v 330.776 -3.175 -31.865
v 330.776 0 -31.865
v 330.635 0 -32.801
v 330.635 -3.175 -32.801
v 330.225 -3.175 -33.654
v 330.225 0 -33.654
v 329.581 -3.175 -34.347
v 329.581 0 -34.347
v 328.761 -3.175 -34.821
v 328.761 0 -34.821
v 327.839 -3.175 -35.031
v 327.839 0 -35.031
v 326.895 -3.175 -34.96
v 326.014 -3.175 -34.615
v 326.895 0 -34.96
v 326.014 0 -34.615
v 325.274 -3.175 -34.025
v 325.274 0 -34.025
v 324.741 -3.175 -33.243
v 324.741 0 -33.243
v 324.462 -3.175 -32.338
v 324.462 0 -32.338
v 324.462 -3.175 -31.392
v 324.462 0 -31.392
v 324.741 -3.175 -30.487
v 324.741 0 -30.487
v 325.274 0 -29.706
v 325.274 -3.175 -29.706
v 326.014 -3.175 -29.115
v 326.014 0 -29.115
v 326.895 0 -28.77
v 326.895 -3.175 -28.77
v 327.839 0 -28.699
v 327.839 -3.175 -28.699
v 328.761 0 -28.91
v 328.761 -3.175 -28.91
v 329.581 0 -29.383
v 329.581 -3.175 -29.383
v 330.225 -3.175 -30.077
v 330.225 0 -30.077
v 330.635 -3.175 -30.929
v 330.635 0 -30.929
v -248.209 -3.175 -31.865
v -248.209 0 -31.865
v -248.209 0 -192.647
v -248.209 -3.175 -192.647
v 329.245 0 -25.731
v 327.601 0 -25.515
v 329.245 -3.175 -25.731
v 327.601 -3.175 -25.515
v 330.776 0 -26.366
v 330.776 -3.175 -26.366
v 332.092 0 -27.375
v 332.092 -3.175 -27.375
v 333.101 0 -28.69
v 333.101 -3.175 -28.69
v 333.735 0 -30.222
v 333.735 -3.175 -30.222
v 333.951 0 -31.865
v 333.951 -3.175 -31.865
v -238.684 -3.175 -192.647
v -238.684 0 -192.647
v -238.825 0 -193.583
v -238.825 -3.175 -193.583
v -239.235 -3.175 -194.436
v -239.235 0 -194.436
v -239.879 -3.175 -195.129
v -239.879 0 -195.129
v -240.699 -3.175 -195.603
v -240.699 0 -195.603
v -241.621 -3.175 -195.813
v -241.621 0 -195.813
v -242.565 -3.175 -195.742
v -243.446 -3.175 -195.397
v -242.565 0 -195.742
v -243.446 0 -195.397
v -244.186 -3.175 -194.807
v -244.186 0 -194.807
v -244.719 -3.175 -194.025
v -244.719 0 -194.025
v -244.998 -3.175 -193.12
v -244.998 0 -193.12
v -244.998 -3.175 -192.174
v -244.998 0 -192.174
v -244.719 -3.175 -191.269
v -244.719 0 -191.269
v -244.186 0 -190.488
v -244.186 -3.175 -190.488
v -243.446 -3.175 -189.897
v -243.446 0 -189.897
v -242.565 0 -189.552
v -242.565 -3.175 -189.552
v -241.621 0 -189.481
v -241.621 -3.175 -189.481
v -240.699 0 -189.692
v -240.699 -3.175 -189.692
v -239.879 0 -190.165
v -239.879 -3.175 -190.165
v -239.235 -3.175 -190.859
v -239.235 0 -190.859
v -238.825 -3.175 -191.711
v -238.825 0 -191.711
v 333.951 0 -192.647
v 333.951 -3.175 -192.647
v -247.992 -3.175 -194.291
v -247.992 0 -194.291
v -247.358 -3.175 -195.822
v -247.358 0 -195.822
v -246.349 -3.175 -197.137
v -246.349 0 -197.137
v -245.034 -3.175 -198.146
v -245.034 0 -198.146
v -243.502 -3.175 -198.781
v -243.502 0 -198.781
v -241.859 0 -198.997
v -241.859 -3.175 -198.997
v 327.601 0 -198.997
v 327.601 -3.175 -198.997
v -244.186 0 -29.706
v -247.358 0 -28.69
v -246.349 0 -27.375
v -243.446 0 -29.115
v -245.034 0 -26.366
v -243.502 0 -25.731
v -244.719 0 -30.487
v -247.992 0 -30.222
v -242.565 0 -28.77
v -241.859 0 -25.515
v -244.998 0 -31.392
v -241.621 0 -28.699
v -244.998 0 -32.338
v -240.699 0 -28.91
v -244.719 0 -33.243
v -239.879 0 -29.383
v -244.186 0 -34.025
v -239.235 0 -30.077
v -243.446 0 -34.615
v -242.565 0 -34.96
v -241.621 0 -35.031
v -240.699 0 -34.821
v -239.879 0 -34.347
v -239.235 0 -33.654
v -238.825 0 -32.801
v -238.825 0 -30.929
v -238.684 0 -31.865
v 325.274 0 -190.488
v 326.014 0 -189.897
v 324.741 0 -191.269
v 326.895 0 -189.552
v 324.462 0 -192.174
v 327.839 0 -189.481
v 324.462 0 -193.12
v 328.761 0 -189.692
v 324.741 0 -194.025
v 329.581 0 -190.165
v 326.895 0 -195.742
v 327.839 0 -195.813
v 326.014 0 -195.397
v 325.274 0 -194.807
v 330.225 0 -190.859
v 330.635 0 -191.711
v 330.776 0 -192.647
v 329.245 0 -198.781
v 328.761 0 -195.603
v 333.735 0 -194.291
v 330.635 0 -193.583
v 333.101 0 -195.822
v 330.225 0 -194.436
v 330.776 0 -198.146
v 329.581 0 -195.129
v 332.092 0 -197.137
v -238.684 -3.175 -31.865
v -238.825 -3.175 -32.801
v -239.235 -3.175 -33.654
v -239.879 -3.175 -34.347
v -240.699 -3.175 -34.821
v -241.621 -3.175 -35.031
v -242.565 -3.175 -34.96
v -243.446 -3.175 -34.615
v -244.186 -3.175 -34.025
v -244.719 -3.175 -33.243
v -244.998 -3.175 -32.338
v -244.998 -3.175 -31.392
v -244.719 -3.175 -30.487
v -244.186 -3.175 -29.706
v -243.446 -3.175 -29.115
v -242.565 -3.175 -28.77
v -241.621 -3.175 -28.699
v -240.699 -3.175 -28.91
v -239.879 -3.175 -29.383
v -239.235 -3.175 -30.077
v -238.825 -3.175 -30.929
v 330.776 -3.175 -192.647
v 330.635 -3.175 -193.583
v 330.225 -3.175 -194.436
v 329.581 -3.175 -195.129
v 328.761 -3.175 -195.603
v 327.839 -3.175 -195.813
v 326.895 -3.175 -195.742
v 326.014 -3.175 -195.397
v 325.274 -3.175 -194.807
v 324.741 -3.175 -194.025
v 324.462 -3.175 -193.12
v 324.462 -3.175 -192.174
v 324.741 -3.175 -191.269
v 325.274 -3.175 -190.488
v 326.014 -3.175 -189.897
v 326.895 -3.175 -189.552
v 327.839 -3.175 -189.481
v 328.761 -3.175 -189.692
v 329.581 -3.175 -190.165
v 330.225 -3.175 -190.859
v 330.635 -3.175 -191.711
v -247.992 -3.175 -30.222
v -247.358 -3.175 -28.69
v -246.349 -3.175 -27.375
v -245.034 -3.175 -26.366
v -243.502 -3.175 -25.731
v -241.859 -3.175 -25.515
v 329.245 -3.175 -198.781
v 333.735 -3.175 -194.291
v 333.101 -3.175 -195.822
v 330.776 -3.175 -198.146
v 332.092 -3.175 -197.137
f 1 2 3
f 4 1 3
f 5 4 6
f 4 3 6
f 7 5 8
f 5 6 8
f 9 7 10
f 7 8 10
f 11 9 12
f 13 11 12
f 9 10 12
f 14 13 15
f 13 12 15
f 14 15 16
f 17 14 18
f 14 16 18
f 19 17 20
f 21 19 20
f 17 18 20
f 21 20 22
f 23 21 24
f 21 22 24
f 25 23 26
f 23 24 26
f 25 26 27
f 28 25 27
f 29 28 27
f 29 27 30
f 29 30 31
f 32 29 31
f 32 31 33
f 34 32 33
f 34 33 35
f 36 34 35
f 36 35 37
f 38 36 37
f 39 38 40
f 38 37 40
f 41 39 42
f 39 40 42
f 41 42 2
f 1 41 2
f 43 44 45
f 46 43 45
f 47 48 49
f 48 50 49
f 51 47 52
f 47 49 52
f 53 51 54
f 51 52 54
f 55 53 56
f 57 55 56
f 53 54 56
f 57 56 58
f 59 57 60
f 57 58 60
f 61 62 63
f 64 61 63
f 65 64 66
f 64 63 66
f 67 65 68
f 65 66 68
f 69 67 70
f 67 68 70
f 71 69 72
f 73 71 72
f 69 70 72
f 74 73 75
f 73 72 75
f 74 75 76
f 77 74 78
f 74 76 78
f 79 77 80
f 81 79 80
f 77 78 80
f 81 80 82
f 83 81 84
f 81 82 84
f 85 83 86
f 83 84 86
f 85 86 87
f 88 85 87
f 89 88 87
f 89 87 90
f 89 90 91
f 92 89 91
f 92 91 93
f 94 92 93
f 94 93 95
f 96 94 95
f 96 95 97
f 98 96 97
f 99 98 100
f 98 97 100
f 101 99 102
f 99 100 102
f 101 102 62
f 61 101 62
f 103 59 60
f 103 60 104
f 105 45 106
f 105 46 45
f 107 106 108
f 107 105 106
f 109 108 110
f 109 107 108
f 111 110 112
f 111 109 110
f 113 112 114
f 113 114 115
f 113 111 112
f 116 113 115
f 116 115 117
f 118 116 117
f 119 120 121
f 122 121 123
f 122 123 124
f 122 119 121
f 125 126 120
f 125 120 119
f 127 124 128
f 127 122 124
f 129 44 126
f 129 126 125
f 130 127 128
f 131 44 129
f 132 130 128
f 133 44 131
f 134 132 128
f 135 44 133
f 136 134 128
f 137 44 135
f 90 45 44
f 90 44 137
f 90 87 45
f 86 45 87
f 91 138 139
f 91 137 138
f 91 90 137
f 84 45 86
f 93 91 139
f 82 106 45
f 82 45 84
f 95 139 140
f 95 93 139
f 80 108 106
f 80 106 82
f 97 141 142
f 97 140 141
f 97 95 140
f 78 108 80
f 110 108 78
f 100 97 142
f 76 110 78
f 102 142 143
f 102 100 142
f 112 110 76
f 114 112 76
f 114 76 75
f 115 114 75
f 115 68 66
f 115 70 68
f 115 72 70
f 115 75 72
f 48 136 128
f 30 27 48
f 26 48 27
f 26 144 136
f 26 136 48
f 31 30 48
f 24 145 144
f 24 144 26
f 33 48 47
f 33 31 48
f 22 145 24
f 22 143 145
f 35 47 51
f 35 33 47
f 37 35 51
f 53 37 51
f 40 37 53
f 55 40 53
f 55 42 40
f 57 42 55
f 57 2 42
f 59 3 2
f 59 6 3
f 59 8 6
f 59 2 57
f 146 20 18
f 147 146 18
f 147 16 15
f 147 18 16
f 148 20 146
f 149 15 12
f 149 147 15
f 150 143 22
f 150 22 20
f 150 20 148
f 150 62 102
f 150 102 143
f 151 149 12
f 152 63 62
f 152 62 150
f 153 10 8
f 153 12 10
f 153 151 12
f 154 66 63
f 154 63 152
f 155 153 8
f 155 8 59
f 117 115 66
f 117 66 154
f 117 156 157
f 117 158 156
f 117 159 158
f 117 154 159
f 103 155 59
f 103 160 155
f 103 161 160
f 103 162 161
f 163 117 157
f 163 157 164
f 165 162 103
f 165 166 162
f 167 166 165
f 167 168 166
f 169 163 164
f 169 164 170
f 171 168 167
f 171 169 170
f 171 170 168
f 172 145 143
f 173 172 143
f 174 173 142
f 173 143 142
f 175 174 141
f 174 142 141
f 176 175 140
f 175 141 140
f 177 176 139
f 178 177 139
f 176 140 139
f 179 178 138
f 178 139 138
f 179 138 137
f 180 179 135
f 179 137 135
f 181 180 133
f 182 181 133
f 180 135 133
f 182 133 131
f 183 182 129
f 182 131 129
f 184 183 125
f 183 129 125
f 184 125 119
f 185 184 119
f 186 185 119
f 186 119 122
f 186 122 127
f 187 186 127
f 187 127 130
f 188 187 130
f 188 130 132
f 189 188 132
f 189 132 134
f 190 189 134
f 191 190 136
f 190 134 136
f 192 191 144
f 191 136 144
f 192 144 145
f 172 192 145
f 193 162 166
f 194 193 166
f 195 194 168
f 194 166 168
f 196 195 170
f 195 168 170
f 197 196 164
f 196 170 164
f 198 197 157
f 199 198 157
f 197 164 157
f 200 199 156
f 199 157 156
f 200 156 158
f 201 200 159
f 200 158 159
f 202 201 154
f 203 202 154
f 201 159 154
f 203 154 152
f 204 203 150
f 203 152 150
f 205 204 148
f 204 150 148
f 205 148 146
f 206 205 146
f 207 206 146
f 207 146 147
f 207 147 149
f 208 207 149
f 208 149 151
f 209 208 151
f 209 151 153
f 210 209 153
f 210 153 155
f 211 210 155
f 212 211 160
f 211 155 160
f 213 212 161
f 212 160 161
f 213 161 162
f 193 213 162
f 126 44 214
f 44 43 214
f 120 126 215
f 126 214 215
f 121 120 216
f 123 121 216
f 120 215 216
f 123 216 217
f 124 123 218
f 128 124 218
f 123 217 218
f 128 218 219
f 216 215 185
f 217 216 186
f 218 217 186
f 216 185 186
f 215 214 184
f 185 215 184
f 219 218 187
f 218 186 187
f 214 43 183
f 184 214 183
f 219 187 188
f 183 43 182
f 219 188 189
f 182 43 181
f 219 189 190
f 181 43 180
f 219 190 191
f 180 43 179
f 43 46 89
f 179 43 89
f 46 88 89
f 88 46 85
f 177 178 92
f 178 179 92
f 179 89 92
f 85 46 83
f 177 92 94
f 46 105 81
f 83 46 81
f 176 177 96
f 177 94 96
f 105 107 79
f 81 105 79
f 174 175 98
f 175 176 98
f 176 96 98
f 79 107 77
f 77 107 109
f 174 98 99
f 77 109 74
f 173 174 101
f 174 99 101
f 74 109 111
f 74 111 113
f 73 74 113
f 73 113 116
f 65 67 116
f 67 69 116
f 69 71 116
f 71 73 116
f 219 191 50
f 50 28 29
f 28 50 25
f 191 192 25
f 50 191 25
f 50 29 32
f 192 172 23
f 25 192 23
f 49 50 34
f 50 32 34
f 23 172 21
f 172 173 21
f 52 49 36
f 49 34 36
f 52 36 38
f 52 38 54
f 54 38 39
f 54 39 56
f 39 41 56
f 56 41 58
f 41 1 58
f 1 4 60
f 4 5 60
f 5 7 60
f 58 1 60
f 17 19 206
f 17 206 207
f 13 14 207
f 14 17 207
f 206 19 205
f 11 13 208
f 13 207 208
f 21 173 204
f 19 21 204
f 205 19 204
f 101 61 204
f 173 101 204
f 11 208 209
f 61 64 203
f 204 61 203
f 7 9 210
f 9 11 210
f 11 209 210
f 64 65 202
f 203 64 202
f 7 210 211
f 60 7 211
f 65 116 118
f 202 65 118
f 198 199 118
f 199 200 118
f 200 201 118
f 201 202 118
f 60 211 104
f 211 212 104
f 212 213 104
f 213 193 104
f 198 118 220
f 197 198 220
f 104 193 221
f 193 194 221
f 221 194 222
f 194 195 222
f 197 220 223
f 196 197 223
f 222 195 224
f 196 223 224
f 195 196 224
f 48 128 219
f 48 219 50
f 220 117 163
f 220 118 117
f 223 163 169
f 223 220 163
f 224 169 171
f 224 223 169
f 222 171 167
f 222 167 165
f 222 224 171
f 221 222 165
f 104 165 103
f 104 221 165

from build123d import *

# Parameters (mm, degrees)
SKETCH1_W           = 582.160000372
SKETCH1_H           = 173.482
SKETCH1_R           = 3.175
BOSS_EXTRUDE1_DEPTH = 3.175
FILLET1_R           = 6.35


with BuildPart() as part:
    # Sketch1 → Boss-Extrude1 (new body)
    with BuildSketch(Plane(origin=(0, 0, 0), x_dir=(1, 0, 0), z_dir=(0, 1, 0))):
        with Locations((42.871461676, 112.256050824)):
            Rectangle(SKETCH1_W, SKETCH1_H)
        with Locations((327.601461862, 192.647050824)):
            Circle(SKETCH1_R, mode=Mode.SUBTRACT)
        with Locations((327.601461862, 31.865050824)):
            Circle(SKETCH1_R, mode=Mode.SUBTRACT)
        with Locations((-241.85853851, 31.865050824)):
            Circle(SKETCH1_R, mode=Mode.SUBTRACT)
        with Locations((-241.85853851, 192.647050824)):
            Circle(SKETCH1_R, mode=Mode.SUBTRACT)
    extrude(amount=-BOSS_EXTRUDE1_DEPTH)

    # Fillet1
    fillet1_edges = [part.edges().sort_by_distance(p)[0] for p in [
        (333.951461862, -1.5875, -25.515050824),
        (-248.20853851, -1.5875, -25.515050824),
        (-248.20853851, -1.5875, -198.997050824),
        (333.951461862, -1.5875, -198.997050824),
    ]]
    fillet(fillet1_edges, radius=FILLET1_R)


solid = part.part
